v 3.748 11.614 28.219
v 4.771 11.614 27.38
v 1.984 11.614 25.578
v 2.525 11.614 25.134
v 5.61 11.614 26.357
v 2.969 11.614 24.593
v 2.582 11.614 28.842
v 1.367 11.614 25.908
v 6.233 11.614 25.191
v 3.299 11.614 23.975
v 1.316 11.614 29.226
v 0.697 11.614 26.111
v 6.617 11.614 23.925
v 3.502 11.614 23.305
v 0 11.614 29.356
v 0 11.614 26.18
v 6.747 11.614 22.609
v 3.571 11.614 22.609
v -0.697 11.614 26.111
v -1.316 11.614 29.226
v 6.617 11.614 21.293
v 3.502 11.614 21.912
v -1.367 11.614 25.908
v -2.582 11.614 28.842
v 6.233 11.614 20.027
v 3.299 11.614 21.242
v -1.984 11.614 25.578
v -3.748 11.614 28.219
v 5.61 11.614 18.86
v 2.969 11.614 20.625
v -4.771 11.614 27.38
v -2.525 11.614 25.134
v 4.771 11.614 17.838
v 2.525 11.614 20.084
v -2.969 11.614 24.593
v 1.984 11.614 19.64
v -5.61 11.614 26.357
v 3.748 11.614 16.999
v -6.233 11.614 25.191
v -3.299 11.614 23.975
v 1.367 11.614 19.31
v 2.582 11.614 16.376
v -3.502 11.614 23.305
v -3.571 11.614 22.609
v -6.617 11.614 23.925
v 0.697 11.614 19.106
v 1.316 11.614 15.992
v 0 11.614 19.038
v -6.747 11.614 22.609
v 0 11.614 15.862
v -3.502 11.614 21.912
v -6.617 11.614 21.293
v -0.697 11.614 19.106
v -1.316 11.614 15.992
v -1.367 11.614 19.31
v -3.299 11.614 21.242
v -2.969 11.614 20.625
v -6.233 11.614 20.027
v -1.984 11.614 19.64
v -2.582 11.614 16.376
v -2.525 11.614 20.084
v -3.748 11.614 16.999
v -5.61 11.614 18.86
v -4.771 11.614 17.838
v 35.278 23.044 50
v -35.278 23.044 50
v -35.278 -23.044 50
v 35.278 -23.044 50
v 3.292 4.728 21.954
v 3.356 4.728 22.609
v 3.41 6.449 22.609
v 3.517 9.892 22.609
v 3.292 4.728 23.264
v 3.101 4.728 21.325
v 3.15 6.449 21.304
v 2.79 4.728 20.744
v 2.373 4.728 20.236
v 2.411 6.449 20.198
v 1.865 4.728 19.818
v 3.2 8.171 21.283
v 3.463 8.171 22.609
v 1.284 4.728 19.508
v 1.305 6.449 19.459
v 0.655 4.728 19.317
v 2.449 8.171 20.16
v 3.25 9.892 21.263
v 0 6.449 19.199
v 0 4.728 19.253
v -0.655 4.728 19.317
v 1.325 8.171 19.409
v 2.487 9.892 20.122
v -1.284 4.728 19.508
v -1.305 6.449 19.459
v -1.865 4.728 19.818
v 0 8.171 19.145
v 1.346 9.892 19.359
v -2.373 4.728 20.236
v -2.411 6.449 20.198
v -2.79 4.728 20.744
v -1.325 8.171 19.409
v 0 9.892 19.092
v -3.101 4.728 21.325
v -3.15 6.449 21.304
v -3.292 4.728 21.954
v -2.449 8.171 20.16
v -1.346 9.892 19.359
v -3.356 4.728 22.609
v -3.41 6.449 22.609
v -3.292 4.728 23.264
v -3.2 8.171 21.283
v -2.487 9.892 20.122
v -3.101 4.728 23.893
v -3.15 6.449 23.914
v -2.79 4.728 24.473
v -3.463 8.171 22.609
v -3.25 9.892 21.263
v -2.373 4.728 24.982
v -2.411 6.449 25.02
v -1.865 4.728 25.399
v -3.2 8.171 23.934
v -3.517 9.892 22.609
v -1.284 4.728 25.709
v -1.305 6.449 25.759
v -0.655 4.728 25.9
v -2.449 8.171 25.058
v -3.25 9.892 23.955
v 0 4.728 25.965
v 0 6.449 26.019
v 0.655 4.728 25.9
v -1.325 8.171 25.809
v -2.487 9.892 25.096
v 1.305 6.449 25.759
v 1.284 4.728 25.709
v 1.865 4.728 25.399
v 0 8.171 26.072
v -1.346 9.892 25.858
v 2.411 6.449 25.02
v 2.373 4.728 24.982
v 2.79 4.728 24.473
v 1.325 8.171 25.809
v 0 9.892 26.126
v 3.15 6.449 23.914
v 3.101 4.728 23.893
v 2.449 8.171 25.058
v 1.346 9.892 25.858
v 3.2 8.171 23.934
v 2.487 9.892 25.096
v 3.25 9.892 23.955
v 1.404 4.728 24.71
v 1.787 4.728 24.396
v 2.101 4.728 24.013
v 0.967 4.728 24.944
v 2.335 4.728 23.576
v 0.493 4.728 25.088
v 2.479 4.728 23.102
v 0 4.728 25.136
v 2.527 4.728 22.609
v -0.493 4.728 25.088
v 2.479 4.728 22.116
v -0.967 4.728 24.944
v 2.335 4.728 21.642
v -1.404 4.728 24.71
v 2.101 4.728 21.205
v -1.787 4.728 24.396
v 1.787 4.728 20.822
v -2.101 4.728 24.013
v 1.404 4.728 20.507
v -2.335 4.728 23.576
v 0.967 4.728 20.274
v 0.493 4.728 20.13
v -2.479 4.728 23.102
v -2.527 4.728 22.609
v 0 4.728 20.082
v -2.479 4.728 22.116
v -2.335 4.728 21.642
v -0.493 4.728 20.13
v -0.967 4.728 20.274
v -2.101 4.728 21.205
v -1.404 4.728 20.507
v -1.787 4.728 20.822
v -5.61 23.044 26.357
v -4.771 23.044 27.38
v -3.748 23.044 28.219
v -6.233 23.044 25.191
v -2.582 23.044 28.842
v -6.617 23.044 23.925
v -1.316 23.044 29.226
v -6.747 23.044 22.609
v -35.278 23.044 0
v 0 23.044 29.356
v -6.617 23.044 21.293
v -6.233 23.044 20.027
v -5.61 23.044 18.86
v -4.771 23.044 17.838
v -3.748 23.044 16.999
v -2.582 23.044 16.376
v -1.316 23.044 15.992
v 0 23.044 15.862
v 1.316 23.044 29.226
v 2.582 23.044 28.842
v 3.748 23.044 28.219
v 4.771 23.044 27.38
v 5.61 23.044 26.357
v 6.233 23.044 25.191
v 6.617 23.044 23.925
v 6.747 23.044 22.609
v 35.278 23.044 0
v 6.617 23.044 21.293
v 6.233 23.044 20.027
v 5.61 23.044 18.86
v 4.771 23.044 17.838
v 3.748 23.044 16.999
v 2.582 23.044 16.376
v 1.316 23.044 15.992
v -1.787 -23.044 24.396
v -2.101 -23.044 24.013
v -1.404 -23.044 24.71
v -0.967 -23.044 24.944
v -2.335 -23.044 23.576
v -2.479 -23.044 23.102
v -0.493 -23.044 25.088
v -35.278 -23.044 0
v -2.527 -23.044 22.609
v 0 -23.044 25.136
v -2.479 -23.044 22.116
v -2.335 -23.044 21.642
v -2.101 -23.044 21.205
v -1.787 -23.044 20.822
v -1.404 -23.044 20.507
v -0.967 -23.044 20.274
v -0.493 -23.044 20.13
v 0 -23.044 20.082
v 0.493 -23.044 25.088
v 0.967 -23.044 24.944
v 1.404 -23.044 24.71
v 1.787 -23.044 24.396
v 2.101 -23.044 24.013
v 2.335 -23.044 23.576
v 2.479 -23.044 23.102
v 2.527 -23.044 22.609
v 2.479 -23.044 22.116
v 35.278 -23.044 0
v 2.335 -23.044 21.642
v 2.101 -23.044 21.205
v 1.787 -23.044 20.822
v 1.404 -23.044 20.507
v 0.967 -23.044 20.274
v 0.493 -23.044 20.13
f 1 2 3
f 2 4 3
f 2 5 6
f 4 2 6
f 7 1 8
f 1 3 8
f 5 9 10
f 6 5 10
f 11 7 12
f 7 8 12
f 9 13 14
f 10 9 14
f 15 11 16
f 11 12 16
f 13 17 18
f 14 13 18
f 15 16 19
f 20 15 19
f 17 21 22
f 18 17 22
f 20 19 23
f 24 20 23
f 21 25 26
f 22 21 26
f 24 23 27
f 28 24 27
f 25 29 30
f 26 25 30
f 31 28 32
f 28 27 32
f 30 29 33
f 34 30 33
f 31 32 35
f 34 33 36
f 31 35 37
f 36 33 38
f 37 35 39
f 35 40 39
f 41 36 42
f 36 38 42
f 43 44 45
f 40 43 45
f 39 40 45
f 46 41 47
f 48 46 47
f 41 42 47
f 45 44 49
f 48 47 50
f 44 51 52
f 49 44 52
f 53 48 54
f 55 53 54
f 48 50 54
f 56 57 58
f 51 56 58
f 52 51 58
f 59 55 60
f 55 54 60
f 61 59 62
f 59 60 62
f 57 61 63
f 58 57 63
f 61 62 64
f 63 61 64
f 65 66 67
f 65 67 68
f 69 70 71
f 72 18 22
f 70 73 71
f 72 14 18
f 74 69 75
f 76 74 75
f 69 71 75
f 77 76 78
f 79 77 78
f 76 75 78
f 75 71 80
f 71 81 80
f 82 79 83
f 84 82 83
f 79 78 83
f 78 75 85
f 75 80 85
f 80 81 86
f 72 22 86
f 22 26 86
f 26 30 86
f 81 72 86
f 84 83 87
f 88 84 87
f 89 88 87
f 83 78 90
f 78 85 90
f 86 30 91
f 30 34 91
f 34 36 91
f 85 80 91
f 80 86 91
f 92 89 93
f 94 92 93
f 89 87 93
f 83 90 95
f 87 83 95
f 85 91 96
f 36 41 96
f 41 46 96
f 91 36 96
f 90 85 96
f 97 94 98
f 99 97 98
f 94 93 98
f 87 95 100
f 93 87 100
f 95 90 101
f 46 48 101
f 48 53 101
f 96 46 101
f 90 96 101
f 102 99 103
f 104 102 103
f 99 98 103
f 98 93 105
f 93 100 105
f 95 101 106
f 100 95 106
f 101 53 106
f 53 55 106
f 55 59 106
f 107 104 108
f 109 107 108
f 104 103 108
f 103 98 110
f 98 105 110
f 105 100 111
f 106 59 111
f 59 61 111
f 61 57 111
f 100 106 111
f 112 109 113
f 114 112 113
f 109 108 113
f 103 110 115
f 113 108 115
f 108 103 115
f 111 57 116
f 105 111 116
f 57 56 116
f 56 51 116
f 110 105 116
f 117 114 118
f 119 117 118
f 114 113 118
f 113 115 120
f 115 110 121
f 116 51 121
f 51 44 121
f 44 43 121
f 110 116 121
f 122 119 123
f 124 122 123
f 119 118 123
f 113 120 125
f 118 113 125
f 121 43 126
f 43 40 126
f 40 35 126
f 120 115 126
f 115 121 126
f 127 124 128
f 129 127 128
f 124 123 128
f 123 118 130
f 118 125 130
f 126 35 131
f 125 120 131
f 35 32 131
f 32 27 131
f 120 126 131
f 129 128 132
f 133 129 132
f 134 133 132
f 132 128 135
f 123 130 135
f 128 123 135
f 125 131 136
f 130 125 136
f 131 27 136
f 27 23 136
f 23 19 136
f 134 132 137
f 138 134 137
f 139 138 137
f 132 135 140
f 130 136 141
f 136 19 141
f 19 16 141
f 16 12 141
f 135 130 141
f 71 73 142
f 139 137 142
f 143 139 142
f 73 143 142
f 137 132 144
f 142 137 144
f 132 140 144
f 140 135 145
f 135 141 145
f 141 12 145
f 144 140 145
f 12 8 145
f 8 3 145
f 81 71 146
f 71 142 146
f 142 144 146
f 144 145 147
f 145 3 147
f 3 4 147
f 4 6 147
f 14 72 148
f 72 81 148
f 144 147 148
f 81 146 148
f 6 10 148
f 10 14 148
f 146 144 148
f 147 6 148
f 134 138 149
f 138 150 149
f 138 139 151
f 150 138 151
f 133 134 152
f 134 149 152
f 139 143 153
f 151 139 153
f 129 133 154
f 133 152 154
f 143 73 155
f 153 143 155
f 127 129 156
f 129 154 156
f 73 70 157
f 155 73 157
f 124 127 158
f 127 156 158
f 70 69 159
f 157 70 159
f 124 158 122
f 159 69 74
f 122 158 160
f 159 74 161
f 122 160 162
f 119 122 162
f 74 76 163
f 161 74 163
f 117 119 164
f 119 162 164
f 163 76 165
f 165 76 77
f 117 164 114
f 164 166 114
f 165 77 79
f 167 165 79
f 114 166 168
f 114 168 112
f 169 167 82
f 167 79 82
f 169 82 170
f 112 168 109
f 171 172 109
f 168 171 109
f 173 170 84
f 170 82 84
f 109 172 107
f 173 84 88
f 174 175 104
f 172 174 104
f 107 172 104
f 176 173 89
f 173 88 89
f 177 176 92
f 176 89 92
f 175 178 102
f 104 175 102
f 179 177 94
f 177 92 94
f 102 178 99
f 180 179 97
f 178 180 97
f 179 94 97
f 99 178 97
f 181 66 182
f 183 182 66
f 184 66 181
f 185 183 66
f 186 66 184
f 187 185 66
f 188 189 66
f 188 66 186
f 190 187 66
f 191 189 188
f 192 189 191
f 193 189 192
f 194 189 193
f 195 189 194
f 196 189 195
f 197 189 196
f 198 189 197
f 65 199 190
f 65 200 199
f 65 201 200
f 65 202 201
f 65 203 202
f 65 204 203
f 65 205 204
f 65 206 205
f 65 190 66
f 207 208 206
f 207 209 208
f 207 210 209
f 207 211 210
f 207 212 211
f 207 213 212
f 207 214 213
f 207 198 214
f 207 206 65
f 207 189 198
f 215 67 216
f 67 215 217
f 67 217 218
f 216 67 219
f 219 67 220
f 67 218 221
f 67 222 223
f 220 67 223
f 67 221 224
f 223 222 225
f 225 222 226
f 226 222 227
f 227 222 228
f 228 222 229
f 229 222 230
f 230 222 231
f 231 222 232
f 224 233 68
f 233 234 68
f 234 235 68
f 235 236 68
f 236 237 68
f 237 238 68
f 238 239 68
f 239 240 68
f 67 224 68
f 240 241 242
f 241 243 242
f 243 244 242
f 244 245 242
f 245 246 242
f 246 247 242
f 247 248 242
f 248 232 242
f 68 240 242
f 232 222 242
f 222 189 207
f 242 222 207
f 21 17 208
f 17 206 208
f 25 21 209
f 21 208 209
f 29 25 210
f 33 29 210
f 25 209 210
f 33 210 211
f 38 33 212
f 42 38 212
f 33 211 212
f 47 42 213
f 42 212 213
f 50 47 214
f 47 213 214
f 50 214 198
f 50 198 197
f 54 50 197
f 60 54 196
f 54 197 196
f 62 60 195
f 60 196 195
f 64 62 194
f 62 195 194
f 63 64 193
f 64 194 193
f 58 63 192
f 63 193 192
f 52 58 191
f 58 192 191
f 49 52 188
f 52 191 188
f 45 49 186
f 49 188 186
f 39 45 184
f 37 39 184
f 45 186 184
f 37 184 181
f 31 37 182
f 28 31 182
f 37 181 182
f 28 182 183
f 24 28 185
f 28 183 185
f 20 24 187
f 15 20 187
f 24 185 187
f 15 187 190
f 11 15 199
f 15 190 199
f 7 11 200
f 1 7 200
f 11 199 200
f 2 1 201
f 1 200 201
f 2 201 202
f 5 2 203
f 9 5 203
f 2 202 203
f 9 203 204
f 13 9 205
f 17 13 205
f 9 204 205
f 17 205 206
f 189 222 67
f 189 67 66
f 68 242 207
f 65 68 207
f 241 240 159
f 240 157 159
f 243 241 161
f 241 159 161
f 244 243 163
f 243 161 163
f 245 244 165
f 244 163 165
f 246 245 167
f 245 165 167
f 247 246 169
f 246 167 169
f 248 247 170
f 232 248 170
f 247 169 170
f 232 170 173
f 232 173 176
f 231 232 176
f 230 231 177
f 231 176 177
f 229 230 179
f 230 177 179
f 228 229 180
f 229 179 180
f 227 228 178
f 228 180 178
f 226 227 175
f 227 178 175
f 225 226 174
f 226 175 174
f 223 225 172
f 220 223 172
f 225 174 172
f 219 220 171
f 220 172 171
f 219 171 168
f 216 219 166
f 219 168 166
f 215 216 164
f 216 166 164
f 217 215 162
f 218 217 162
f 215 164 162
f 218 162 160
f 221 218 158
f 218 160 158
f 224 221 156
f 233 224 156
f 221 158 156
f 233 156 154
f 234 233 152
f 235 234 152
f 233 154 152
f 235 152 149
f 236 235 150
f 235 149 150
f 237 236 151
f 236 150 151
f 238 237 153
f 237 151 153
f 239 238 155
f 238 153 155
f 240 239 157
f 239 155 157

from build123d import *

# Parameters (mm, degrees)
SKETCH4_W           = 70.55566623
SKETCH4_H           = 46.087100556
BOSS_EXTRUDE1_DEPTH = 50


# Read off the part's stored shape, not the designer's step: AdvancedHole2
with BuildPart() as part:
    # Sketch4 → Boss-Extrude1 (new body)
    with BuildSketch(Plane.XY):
        Rectangle(SKETCH4_W, SKETCH4_H)
    extrude(amount=BOSS_EXTRUDE1_DEPTH)

    # AdvancedHole2 outline → AdvancedHole2 (revolve, cut)
    with BuildSketch(Plane.XY.offset(22.608820769)):
        Polygon((3.570986, 11.613550278), (6.746875, 11.613550278), (6.746875, 23.043550278), (0, 23.043550278), (0, -23.043550278), (2.5273, -23.043550278), (2.5273, 4.727610278), (3.356012175, 4.727610278), align=None)
    revolve(axis=Axis((0, 0, 22.608820769), (0, 1, 0)), mode=Mode.SUBTRACT)


solid = part.part
